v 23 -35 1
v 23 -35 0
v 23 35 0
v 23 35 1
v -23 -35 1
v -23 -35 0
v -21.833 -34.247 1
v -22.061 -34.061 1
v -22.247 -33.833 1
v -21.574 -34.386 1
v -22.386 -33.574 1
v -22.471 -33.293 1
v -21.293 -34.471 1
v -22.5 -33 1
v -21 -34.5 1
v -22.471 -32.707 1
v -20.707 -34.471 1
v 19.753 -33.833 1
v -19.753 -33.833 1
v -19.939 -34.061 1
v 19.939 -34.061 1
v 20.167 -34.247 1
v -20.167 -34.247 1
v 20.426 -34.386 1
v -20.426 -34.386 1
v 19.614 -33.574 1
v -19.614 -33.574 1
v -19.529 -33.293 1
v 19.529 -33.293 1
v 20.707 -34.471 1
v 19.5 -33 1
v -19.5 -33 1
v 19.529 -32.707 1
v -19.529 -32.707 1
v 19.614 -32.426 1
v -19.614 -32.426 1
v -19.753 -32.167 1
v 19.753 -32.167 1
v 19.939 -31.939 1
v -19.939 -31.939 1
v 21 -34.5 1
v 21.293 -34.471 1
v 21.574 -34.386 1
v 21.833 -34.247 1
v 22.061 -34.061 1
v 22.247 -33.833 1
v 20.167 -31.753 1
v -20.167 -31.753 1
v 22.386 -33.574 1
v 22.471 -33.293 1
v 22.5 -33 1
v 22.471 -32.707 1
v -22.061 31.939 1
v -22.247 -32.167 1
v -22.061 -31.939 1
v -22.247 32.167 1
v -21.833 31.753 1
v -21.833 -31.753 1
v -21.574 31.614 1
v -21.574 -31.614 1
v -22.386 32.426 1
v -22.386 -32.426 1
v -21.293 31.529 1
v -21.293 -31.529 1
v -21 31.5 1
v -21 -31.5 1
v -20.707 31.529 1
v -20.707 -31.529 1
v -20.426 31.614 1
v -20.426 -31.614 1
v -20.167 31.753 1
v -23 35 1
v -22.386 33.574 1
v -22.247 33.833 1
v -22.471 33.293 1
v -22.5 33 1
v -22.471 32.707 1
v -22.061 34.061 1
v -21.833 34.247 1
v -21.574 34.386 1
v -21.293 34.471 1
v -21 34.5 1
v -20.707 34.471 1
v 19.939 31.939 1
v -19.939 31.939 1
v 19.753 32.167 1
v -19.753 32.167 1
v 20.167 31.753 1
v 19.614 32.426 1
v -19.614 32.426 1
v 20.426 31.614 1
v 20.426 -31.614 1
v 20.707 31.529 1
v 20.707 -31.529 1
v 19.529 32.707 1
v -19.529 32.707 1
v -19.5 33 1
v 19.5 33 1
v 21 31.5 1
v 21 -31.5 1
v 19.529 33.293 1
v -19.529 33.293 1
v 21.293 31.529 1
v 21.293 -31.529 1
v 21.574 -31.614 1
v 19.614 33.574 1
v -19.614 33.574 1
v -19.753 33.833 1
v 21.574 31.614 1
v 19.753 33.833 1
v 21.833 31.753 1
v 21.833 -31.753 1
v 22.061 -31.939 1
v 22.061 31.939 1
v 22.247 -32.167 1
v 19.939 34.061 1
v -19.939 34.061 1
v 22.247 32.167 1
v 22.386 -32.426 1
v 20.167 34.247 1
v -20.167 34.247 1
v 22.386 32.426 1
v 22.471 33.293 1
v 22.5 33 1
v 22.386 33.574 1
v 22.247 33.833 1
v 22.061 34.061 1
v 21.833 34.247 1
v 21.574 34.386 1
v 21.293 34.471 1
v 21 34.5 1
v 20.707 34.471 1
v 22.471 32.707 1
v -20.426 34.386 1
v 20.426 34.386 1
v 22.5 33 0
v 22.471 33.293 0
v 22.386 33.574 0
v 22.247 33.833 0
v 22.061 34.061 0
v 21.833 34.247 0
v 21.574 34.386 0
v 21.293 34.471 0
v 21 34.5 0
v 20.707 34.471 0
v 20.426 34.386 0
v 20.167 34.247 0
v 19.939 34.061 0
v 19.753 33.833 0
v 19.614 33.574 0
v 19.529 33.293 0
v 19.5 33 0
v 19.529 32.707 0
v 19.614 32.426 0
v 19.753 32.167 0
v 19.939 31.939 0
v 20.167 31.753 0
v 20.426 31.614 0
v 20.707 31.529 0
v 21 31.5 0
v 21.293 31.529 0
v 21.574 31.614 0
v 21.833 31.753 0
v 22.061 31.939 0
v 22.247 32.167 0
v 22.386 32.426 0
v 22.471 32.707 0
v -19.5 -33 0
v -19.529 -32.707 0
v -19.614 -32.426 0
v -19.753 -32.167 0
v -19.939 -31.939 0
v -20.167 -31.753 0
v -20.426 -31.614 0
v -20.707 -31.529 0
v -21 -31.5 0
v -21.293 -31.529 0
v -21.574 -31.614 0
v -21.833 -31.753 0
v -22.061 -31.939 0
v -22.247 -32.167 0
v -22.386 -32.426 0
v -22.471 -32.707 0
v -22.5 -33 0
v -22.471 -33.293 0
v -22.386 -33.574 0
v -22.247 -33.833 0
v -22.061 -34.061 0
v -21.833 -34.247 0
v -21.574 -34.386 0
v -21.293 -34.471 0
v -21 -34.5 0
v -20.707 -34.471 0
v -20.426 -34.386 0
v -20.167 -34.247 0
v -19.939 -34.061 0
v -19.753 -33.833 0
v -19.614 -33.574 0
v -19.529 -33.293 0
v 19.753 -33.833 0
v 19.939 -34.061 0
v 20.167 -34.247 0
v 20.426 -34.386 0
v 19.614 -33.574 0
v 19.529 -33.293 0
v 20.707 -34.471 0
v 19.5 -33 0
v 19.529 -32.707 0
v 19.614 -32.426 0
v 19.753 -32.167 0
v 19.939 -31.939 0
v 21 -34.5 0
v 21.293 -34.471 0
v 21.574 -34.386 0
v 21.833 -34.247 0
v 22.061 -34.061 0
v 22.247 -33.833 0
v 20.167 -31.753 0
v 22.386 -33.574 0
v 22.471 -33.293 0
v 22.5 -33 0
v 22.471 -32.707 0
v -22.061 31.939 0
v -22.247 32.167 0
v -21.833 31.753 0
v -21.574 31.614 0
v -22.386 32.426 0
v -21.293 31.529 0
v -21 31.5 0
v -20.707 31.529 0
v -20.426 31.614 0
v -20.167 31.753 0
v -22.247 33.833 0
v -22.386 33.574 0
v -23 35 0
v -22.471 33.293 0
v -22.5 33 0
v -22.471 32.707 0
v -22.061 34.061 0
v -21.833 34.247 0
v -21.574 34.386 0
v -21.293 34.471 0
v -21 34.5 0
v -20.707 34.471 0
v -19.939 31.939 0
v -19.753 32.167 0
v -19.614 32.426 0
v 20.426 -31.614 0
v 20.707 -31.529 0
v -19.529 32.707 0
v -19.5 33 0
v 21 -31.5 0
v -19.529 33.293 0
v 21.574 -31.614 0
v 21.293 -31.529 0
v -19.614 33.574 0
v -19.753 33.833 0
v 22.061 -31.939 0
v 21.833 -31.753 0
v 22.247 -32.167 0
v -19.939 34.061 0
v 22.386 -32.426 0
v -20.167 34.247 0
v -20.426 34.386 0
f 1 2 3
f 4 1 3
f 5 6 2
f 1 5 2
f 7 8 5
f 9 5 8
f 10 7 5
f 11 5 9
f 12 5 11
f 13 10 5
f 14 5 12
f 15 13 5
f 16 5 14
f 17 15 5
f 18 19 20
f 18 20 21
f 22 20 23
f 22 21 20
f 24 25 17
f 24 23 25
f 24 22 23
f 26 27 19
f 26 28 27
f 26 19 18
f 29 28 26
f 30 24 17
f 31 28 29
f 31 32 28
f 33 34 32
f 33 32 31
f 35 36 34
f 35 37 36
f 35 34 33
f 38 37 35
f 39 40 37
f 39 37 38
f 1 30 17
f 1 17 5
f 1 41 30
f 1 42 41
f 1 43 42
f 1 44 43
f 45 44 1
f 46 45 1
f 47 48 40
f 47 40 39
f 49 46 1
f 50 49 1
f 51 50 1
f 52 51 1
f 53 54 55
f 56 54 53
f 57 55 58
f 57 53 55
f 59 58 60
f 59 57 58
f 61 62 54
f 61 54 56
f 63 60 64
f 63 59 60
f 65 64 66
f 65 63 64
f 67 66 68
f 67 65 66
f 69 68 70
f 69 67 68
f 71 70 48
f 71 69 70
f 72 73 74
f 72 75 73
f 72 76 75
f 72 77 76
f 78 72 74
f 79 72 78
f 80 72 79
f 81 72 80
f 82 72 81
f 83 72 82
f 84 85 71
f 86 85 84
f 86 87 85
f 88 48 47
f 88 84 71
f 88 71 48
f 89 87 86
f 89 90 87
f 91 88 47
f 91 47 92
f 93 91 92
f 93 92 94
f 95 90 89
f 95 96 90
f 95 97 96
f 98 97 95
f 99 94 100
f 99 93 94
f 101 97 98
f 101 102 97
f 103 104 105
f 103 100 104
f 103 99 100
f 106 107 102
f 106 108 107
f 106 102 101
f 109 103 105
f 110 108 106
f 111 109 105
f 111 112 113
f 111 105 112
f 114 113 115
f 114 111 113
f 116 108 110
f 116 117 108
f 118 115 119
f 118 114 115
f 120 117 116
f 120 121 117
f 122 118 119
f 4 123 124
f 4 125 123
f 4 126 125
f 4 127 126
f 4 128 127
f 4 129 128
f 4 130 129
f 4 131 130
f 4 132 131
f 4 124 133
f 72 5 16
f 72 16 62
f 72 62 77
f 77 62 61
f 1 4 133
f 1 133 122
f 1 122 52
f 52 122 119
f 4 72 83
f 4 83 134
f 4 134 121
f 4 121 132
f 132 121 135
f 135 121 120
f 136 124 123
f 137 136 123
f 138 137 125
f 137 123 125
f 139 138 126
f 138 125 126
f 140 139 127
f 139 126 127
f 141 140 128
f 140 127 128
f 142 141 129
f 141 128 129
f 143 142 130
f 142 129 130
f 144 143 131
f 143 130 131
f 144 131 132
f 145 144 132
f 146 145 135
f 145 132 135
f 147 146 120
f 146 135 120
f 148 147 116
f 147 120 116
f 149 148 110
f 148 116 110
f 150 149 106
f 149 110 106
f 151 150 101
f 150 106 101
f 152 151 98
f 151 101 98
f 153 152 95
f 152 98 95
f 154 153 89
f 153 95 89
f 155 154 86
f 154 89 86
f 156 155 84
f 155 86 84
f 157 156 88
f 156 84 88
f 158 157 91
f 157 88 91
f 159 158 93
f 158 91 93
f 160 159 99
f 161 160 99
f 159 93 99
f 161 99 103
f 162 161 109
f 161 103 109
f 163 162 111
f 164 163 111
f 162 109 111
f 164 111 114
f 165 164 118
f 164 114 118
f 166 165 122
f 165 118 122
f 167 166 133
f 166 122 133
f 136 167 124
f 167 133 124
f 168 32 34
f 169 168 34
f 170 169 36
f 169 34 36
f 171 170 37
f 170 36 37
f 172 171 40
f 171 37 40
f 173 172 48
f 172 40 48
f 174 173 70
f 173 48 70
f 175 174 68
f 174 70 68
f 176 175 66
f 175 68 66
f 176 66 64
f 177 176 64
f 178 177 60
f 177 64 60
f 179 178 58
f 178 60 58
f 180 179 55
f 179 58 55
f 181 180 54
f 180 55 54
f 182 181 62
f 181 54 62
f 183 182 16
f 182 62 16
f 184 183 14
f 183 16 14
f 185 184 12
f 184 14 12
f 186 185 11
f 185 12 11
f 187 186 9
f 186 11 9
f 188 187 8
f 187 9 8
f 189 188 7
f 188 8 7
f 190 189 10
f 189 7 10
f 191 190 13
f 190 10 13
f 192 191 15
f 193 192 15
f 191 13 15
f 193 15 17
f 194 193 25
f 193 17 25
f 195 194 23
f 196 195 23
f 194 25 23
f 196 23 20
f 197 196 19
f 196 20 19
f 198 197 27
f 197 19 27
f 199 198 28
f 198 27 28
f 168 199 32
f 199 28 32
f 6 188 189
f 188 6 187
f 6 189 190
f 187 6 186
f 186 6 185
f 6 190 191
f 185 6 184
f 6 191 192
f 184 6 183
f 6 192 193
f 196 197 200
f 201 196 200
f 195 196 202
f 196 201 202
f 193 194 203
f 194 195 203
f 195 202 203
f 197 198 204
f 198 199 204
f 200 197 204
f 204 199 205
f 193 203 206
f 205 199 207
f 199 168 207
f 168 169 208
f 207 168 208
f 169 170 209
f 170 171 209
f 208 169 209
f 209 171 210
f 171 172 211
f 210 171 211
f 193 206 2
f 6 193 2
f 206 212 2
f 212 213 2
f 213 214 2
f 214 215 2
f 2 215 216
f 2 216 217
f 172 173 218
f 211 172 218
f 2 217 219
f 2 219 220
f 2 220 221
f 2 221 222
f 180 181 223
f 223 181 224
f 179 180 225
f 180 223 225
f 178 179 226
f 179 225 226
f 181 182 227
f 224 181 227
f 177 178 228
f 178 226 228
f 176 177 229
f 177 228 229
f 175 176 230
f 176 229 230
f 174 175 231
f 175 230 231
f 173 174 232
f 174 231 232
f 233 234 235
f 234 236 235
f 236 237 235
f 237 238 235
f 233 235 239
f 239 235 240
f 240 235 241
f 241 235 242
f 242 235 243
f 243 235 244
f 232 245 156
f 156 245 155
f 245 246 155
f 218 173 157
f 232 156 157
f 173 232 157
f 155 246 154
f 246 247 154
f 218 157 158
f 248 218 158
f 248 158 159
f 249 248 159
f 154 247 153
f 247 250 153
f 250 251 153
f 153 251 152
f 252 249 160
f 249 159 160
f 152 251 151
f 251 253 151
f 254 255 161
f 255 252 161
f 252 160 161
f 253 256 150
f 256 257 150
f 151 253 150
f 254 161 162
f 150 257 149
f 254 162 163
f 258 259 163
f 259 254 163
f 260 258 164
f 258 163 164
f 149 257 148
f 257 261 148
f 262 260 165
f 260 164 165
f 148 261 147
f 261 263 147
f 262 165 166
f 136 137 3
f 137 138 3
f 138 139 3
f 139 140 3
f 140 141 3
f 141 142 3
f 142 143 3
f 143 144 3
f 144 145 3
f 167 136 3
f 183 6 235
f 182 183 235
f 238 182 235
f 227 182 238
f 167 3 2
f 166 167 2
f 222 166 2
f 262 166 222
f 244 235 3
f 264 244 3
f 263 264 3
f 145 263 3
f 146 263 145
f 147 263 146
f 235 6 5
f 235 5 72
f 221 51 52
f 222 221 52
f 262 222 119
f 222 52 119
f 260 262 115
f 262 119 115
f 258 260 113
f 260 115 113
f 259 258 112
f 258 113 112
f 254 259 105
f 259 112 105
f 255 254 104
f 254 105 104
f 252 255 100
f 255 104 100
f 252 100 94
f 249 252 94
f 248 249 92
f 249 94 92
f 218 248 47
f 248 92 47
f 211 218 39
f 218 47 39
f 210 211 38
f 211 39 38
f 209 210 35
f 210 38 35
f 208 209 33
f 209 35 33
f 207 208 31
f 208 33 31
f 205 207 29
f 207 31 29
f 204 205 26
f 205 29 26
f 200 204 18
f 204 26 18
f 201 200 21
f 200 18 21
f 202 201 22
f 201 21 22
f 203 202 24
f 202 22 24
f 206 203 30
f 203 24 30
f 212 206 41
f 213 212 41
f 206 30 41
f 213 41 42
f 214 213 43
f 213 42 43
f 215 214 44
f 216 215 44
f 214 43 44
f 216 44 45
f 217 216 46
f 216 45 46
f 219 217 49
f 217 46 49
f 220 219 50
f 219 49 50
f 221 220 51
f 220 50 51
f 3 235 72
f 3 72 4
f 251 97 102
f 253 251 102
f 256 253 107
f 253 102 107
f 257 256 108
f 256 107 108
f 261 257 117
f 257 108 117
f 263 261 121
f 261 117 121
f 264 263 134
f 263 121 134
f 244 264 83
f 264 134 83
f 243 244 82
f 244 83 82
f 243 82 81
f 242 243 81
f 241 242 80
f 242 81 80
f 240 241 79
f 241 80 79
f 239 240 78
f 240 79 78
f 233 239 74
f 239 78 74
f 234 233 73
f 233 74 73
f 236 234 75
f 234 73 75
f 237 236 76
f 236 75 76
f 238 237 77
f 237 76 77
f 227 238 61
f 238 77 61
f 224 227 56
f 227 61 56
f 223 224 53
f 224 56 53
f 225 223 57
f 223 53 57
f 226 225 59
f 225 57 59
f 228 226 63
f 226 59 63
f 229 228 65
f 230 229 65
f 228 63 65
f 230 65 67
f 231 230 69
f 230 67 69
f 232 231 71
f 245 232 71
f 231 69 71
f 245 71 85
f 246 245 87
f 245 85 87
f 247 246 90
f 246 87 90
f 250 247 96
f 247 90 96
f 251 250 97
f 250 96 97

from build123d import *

# Parameters (mm, degrees)
CROQUIS1_W              = 46
CROQUIS1_H              = 70
SALIENTE_EXTRUIR1_DEPTH = 1
CROQUIS2_R              = 1.5
CORTAR_EXTRUIR1_DEPTH   = 1


with BuildPart() as part:
    # Croquis1 → Saliente-Extruir1 (new body)
    with BuildSketch(Plane.XY):
        Rectangle(CROQUIS1_W, CROQUIS1_H)
    extrude(amount=SALIENTE_EXTRUIR1_DEPTH)

    # Croquis2 → Cortar-Extruir1 (cut)
    with BuildSketch(Plane.XY.offset(1)):
        with Locations((-21, -33)):
            Circle(CROQUIS2_R)
        with Locations((21, -33)):
            Circle(CROQUIS2_R)
        with Locations((-21, 33)):
            Circle(CROQUIS2_R)
        with Locations((21, 33)):
            Circle(CROQUIS2_R)
    extrude(amount=-CORTAR_EXTRUIR1_DEPTH, mode=Mode.SUBTRACT)


solid = part.part
